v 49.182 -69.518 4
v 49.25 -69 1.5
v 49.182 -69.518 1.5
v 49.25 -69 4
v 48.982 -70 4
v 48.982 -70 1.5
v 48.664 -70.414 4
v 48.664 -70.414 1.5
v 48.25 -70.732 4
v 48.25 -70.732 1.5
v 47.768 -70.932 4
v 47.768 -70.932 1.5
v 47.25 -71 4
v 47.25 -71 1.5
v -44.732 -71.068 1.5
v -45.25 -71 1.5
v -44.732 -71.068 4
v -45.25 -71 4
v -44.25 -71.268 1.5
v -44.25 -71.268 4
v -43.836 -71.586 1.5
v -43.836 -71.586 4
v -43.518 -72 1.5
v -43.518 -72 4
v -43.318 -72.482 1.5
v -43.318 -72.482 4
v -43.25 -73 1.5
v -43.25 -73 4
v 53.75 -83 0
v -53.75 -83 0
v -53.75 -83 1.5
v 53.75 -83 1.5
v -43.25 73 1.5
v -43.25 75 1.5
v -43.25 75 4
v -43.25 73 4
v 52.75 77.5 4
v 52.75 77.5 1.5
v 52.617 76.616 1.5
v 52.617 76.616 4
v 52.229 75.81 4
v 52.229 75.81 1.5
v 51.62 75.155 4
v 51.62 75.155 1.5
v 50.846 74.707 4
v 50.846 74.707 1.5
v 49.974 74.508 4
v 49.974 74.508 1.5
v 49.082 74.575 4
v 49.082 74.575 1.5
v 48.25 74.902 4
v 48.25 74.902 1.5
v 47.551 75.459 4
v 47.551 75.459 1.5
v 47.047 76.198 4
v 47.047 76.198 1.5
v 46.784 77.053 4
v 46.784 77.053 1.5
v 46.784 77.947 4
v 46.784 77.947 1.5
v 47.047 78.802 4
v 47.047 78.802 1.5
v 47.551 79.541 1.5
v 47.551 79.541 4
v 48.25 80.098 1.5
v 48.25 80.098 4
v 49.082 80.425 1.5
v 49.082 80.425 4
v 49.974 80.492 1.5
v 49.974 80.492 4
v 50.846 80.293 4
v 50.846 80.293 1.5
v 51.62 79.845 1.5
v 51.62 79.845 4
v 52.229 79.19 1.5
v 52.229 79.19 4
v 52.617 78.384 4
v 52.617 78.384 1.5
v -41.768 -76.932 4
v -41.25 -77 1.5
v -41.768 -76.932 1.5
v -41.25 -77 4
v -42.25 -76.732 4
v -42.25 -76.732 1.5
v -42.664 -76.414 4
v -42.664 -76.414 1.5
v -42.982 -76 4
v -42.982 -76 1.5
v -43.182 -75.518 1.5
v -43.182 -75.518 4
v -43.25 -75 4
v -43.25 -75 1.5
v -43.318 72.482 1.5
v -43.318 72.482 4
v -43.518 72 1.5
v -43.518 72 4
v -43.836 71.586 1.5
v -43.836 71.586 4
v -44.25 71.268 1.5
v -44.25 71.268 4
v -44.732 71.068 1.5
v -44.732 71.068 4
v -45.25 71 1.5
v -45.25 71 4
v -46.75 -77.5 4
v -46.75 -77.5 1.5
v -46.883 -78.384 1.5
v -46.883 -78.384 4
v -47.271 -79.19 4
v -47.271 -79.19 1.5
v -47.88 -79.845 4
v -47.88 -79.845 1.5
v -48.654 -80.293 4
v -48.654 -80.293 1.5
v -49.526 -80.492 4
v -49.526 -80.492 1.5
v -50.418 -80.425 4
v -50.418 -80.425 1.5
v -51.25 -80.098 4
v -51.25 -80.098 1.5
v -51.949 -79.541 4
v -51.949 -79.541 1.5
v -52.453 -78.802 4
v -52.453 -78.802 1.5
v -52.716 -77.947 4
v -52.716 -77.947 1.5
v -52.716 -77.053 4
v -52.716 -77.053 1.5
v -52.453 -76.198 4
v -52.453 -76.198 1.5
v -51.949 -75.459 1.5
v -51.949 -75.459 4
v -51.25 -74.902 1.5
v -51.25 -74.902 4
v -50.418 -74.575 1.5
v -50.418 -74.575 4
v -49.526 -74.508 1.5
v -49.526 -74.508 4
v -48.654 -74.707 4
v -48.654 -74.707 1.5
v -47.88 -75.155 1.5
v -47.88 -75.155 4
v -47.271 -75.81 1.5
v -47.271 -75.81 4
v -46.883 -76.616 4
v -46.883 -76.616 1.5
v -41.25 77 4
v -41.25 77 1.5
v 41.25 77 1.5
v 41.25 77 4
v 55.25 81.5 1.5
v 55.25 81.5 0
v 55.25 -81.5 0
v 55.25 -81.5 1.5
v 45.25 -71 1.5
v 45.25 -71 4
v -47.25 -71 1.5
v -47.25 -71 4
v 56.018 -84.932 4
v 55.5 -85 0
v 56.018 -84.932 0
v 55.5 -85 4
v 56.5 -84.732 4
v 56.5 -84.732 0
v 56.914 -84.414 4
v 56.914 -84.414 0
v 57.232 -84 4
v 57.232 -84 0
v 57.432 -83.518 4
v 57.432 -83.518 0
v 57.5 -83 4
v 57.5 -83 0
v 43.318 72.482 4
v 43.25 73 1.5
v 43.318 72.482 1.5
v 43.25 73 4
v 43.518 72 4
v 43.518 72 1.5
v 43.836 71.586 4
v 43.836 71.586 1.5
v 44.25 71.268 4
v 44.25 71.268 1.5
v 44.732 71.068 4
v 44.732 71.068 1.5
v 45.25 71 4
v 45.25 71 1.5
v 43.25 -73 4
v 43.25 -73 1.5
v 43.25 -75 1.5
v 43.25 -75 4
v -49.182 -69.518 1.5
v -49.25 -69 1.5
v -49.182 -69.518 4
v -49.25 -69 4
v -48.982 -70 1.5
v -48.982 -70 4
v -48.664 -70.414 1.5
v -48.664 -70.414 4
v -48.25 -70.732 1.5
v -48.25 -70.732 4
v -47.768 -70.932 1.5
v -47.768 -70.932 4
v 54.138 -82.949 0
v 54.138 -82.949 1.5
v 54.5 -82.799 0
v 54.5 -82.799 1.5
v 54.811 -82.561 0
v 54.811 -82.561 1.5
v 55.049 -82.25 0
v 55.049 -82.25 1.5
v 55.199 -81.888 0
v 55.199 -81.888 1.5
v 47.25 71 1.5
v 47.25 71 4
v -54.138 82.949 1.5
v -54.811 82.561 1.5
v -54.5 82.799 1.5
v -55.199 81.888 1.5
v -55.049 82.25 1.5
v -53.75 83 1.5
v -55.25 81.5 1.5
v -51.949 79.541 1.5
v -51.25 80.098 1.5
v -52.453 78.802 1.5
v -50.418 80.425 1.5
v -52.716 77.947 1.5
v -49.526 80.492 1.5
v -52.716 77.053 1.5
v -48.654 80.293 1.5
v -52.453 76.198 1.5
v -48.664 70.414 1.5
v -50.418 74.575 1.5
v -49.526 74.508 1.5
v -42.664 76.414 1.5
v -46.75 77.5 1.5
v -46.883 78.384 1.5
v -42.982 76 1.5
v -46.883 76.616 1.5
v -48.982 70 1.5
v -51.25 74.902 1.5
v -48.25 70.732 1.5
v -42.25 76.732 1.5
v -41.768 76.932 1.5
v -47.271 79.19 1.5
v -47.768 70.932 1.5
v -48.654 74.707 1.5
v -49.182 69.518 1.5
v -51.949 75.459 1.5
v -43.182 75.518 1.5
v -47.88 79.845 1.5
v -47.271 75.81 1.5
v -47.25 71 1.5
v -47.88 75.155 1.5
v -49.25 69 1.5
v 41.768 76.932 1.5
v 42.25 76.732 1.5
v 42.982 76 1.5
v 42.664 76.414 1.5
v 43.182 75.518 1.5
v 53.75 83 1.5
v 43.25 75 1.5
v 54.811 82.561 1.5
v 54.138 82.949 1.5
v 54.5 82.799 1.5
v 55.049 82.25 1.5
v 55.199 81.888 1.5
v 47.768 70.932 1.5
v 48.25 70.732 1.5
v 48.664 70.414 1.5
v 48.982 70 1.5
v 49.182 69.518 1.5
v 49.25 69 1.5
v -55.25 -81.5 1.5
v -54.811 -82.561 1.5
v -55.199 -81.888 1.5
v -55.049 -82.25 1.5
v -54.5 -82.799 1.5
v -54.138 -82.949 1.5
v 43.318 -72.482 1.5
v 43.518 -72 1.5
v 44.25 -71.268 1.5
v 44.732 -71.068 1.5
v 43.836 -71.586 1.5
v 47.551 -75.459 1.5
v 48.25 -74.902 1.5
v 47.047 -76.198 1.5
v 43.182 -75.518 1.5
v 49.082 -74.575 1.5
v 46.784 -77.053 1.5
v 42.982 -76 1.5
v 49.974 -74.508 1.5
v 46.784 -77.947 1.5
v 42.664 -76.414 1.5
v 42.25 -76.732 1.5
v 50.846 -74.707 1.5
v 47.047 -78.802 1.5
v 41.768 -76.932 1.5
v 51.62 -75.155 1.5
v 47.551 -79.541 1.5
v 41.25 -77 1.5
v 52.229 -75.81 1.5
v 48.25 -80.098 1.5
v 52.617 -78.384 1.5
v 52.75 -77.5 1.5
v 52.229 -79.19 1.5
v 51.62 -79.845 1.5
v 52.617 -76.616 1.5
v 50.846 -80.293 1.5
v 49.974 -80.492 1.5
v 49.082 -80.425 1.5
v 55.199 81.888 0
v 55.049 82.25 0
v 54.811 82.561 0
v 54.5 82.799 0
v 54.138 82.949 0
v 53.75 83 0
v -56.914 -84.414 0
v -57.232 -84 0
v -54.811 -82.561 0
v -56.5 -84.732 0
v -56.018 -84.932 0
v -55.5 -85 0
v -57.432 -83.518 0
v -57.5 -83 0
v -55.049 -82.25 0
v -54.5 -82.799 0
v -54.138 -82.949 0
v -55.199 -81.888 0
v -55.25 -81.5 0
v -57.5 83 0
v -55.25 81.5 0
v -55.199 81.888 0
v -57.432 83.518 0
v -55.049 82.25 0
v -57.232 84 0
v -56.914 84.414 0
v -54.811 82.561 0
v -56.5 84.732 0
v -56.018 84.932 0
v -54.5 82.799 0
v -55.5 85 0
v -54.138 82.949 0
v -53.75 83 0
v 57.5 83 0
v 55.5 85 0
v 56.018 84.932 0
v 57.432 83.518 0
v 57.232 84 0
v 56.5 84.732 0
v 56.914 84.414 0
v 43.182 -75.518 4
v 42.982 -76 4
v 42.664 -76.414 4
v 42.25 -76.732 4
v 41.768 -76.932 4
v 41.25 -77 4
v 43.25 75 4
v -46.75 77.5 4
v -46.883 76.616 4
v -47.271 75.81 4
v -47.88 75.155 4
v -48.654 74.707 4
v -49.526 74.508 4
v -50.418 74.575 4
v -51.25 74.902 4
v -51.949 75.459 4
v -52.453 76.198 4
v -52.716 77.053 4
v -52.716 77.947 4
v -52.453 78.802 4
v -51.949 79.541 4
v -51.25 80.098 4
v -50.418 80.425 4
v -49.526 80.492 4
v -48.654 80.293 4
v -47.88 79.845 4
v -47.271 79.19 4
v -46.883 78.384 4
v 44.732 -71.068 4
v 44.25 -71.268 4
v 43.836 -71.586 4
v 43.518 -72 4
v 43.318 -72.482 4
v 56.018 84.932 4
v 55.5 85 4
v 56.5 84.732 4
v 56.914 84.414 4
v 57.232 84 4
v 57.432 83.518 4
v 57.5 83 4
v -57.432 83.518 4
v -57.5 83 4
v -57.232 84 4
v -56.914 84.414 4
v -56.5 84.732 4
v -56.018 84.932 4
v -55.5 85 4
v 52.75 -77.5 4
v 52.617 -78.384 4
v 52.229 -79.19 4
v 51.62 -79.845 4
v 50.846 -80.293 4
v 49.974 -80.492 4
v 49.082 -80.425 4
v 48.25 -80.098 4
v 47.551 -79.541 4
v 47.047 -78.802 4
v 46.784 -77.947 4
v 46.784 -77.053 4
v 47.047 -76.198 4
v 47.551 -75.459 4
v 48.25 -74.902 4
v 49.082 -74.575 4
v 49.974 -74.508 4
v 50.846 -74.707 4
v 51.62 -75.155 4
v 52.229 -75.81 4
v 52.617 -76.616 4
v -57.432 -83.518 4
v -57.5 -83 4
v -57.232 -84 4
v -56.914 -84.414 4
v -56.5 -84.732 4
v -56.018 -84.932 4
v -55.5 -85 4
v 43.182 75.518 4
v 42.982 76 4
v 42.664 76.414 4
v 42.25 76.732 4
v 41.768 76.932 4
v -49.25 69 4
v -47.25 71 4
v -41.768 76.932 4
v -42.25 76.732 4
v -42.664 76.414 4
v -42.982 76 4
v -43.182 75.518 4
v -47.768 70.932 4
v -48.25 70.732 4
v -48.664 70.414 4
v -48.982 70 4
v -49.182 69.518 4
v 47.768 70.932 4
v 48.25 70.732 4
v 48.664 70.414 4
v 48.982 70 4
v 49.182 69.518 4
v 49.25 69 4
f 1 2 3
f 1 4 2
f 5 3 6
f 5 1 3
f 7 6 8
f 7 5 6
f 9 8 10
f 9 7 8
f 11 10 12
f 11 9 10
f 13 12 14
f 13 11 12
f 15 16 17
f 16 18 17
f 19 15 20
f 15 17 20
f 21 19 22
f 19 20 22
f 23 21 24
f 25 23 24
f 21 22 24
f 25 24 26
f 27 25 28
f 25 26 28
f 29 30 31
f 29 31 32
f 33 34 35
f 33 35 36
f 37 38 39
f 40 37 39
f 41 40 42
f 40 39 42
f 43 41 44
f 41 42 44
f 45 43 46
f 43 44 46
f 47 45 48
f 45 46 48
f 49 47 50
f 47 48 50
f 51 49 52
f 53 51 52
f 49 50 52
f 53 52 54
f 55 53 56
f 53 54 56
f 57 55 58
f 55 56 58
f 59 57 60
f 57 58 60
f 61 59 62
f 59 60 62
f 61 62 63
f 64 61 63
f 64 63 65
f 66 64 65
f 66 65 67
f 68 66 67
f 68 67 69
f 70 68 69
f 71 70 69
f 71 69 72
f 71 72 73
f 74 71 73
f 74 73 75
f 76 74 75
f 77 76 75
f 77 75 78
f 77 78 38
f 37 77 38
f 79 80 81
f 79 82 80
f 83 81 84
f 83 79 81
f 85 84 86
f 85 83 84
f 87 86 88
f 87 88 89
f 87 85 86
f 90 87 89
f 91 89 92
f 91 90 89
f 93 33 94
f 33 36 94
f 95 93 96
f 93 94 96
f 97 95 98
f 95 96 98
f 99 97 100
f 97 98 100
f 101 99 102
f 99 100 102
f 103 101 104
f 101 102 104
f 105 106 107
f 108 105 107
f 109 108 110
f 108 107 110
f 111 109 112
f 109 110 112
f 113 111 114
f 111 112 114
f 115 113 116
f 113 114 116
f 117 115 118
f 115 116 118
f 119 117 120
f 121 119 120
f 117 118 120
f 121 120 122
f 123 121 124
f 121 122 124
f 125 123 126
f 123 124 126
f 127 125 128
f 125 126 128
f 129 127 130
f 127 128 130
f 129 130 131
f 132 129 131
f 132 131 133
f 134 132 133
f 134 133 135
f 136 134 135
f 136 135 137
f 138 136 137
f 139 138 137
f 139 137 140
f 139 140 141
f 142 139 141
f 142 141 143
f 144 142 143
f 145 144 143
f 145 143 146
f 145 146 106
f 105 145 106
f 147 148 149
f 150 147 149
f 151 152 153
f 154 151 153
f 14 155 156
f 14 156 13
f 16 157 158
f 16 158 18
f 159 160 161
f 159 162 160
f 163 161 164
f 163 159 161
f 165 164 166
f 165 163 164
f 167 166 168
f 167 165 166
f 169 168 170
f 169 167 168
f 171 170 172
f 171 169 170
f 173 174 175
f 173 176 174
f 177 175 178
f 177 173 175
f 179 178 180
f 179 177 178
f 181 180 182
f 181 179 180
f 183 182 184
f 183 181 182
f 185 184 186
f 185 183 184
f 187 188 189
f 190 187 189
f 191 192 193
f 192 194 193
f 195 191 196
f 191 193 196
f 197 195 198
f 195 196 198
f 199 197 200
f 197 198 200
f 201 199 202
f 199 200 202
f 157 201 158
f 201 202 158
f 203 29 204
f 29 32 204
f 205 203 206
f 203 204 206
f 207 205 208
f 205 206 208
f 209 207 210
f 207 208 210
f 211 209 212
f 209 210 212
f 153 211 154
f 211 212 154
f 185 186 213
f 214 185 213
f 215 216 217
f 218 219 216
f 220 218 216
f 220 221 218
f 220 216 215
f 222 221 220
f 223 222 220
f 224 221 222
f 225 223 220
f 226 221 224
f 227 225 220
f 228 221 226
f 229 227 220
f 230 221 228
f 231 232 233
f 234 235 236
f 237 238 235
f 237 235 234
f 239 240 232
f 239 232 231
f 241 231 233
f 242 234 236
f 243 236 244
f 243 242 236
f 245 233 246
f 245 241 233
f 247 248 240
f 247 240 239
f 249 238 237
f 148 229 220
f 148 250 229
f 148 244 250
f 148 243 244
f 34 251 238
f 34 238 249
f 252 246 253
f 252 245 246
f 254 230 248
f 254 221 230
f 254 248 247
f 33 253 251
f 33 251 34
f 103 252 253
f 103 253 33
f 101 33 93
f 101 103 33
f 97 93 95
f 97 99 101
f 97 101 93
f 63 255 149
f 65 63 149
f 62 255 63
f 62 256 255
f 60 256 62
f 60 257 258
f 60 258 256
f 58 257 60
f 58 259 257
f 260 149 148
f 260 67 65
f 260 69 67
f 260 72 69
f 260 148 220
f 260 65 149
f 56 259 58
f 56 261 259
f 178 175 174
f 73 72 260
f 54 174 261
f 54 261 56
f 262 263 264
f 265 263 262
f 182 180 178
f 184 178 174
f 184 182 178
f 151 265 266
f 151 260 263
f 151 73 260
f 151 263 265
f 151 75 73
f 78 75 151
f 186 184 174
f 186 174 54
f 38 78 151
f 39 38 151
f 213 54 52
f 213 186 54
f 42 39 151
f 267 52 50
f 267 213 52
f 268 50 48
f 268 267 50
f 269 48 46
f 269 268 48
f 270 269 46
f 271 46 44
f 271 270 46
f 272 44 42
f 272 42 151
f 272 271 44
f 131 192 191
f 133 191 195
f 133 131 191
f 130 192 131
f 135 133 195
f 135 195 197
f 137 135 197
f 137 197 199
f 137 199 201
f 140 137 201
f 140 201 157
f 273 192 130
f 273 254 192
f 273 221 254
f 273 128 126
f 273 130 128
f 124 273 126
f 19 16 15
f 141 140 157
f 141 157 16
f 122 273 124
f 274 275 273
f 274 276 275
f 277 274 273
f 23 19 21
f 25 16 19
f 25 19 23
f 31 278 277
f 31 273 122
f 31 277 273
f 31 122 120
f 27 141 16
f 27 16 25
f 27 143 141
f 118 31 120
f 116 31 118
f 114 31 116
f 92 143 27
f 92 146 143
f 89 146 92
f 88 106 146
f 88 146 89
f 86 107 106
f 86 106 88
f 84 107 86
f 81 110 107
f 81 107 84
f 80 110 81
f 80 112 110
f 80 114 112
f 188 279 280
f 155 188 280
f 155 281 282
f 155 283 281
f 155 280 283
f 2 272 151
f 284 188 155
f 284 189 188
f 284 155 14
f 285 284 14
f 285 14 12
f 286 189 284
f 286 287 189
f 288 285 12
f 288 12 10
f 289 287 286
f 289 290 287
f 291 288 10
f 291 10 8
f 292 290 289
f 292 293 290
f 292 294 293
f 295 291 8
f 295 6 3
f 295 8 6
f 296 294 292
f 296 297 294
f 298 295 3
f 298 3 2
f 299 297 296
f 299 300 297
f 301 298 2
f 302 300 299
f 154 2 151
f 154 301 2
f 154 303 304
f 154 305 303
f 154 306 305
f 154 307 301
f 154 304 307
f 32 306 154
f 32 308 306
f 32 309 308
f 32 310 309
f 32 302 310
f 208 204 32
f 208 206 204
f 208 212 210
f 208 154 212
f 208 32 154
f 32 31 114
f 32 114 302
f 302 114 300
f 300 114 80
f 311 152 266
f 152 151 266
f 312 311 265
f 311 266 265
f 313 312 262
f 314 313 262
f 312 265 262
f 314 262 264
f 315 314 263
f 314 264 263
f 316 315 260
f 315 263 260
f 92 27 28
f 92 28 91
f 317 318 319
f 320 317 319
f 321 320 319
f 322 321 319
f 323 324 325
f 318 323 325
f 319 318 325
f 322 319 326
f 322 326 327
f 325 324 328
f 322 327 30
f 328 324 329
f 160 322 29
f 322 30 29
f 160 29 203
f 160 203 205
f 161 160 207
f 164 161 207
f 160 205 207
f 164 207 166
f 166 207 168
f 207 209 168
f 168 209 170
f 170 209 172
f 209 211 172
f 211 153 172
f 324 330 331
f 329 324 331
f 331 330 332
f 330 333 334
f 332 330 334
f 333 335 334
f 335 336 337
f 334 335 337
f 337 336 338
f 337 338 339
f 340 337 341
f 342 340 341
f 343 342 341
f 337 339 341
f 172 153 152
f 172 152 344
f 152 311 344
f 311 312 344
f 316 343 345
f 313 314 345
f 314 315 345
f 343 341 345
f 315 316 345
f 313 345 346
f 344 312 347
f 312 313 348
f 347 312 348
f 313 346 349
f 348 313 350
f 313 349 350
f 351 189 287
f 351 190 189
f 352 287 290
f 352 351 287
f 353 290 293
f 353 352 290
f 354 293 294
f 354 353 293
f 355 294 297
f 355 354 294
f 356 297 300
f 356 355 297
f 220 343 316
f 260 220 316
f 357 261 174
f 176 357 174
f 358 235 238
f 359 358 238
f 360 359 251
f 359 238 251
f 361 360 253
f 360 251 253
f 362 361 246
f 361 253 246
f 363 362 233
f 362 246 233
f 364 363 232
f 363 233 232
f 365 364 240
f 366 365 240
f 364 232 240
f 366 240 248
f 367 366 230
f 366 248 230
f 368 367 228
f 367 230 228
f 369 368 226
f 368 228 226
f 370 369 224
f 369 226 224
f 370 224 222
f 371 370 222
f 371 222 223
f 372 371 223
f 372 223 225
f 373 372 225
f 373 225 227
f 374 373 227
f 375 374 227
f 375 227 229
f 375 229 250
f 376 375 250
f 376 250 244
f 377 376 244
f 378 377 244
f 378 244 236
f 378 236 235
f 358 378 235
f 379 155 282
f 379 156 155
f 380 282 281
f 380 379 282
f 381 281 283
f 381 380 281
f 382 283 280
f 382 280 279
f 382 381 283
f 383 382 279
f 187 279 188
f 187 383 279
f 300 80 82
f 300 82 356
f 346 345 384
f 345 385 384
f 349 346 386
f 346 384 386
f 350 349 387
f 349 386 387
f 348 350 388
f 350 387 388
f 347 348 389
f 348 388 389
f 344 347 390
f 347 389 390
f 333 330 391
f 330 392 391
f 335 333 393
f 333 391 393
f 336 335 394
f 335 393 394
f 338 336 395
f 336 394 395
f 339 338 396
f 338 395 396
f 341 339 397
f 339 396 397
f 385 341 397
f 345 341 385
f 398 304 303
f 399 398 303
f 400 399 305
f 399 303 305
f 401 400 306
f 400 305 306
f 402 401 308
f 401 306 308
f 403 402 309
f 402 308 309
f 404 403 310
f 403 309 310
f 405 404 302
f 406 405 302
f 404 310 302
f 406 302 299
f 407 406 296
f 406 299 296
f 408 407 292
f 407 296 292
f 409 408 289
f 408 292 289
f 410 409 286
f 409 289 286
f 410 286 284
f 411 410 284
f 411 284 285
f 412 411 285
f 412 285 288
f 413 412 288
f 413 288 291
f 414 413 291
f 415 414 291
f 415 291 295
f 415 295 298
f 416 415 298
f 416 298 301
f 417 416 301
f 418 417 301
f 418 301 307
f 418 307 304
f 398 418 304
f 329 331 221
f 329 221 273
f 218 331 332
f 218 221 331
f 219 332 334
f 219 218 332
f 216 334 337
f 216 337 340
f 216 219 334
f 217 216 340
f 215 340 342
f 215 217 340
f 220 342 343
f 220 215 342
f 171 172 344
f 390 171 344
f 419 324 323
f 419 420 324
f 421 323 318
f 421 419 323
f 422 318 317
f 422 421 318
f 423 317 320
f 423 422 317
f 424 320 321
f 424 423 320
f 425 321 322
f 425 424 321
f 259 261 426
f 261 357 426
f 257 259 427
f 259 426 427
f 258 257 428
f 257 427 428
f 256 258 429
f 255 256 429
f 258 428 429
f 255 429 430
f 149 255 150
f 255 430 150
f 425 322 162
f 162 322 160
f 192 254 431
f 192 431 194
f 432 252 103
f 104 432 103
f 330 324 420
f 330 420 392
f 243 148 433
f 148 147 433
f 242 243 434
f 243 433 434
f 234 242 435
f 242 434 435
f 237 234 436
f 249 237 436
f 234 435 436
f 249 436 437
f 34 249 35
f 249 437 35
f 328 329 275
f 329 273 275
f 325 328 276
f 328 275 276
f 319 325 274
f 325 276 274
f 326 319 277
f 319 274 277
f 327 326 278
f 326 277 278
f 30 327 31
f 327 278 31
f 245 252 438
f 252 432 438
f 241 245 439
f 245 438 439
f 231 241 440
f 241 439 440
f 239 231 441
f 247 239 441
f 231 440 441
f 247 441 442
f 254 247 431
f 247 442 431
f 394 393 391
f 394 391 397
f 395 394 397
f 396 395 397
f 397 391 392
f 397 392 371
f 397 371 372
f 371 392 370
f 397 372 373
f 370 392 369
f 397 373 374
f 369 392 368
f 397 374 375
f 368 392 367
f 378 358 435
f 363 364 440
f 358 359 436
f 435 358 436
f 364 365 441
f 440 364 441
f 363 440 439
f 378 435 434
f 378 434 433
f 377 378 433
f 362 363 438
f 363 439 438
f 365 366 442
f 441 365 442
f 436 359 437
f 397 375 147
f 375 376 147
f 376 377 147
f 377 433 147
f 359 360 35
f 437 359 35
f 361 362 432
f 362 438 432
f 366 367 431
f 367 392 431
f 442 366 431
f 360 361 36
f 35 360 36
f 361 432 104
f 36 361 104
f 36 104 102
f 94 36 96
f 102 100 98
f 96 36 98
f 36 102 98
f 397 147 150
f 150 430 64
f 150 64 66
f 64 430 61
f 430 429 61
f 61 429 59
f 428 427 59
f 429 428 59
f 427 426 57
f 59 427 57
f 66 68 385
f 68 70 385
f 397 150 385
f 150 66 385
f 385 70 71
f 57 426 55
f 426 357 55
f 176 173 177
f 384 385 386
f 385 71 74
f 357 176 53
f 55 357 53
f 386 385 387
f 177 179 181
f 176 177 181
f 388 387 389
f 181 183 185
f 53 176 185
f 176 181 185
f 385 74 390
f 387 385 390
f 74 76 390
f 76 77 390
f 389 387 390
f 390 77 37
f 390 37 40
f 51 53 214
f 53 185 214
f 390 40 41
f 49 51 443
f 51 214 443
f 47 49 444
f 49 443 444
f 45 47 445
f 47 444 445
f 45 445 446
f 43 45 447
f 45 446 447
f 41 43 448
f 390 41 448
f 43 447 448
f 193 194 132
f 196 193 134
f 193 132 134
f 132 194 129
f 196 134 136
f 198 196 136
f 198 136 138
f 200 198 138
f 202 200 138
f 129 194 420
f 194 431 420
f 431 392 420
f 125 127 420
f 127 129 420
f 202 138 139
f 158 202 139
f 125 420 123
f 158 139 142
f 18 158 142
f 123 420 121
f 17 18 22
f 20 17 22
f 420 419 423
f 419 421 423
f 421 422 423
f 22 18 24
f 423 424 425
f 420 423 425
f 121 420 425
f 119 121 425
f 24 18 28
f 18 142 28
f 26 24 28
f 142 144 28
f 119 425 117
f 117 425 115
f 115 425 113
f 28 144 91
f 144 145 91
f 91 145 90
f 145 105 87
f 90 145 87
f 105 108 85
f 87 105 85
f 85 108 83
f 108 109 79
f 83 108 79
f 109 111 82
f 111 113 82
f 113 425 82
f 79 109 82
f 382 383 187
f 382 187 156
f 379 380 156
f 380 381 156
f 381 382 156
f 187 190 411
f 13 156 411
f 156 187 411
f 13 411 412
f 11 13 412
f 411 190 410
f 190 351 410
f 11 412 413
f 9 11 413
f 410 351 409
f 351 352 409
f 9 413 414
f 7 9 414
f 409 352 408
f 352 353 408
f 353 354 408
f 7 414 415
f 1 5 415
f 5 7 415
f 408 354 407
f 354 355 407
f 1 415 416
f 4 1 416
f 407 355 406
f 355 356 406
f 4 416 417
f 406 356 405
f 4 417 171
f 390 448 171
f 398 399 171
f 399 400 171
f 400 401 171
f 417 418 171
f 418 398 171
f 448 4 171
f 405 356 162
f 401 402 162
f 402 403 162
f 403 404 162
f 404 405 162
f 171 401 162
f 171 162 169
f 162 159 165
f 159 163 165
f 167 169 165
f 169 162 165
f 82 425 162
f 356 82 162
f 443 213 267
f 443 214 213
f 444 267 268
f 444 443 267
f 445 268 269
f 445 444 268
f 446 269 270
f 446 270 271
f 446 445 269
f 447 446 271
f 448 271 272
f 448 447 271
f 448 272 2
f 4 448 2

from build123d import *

# Parameters (mm, degrees)
F0_W      = 115
F0_H      = 170
F1_DEPTH  = 4
F2_W      = 110.5
F2_H      = 166
F3_DEPTH  = 1.5
F4_W      = 98.5
F4_H      = 154
F5_DEPTH  = 2.501
F7_W      = 6
F7_H      = 6
F8_DEPTH  = 2.5
F9_R      = 3
F10_DEPTH = 2.501
F11_R     = 2
F12_R     = 2
F13_R     = 1.5


with BuildPart() as f1:
    # F0 (on Top) → F1 (new body)
    with BuildSketch(Plane.XY):
        Rectangle(F0_W, F0_H)
    extrude(amount=F1_DEPTH)

    # F2 (on face) → F3 (cut)
    with BuildSketch(Plane(origin=(0, 0, 0), x_dir=(1, 0, 0), z_dir=(0, 0, -1))):
        Rectangle(F2_W, F2_H)
    extrude(amount=-F3_DEPTH, mode=Mode.SUBTRACT)

    # F4 (on face) → F5 (cut, through all)
    with BuildSketch(Plane(origin=(0, 0, 1.5), x_dir=(1, 0, 0), z_dir=(0, 0, -1))):
        Rectangle(F4_W, F4_H)
    extrude(amount=-F5_DEPTH, mode=Mode.SUBTRACT)

    # F7 (on face) → F8 (join, through all)
    with BuildSketch(Plane(origin=(0, 0, 1.5), x_dir=(1, 0, 0), z_dir=(0, 0, -1))):
        with Locations((46.25, -74)):
            Rectangle(F7_W, F7_H)
        with Locations((-46.25, -74)):
            Rectangle(F7_W, F7_H)
        with Locations((-46.25, 74)):
            Rectangle(F7_W, F7_H)
        with Locations((46.25, 74)):
            Rectangle(F7_W, F7_H)
    extrude(amount=-F8_DEPTH)

    # F9 (on face) → F10 (cut, through all)
    with BuildSketch(Plane(origin=(0, 0, 1.5), x_dir=(1, 0, 0), z_dir=(0, 0, -1))):
        with Locations((49.75, -77.5)):
            Circle(F9_R)
        with Locations((-49.75, -77.5)):
            Circle(F9_R)
        with Locations((-49.75, 77.5)):
            Circle(F9_R)
        with Locations((49.75, 77.5)):
            Circle(F9_R)
    extrude(amount=-F10_DEPTH, mode=Mode.SUBTRACT)

    # F11
    f11_edges = [f1.edges().sort_by_distance(p)[0] for p in [
        (-43.25, 77, 2.75),
        (-43.25, 71, 2.75),
        (-49.25, 71, 2.75),
        (49.25, 71, 2.75),
        (43.25, 71, 2.75),
        (43.25, 77, 2.75),
        (49.25, -71, 2.75),
        (43.25, -71, 2.75),
        (43.25, -77, 2.75),
        (-43.25, -77, 2.75),
        (-43.25, -71, 2.75),
        (-49.25, -71, 2.75),
    ]]
    fillet(f11_edges, radius=F11_R)

    # F12
    f12_edges = [f1.edges().sort_by_distance(p)[0] for p in [
        (-57.5, 85, 2),
        (57.5, 85, 2),
        (57.5, -85, 2),
        (-57.5, -85, 2),
    ]]
    fillet(f12_edges, radius=F12_R)

    # F13
    f13_edges = [f1.edges().sort_by_distance(p)[0] for p in [
        (55.25, 83, 0.75),
        (-55.25, 83, 0.75),
        (-55.25, -83, 0.75),
        (55.25, -83, 0.75),
    ]]
    fillet(f13_edges, radius=F13_R)


solid = f1.part
